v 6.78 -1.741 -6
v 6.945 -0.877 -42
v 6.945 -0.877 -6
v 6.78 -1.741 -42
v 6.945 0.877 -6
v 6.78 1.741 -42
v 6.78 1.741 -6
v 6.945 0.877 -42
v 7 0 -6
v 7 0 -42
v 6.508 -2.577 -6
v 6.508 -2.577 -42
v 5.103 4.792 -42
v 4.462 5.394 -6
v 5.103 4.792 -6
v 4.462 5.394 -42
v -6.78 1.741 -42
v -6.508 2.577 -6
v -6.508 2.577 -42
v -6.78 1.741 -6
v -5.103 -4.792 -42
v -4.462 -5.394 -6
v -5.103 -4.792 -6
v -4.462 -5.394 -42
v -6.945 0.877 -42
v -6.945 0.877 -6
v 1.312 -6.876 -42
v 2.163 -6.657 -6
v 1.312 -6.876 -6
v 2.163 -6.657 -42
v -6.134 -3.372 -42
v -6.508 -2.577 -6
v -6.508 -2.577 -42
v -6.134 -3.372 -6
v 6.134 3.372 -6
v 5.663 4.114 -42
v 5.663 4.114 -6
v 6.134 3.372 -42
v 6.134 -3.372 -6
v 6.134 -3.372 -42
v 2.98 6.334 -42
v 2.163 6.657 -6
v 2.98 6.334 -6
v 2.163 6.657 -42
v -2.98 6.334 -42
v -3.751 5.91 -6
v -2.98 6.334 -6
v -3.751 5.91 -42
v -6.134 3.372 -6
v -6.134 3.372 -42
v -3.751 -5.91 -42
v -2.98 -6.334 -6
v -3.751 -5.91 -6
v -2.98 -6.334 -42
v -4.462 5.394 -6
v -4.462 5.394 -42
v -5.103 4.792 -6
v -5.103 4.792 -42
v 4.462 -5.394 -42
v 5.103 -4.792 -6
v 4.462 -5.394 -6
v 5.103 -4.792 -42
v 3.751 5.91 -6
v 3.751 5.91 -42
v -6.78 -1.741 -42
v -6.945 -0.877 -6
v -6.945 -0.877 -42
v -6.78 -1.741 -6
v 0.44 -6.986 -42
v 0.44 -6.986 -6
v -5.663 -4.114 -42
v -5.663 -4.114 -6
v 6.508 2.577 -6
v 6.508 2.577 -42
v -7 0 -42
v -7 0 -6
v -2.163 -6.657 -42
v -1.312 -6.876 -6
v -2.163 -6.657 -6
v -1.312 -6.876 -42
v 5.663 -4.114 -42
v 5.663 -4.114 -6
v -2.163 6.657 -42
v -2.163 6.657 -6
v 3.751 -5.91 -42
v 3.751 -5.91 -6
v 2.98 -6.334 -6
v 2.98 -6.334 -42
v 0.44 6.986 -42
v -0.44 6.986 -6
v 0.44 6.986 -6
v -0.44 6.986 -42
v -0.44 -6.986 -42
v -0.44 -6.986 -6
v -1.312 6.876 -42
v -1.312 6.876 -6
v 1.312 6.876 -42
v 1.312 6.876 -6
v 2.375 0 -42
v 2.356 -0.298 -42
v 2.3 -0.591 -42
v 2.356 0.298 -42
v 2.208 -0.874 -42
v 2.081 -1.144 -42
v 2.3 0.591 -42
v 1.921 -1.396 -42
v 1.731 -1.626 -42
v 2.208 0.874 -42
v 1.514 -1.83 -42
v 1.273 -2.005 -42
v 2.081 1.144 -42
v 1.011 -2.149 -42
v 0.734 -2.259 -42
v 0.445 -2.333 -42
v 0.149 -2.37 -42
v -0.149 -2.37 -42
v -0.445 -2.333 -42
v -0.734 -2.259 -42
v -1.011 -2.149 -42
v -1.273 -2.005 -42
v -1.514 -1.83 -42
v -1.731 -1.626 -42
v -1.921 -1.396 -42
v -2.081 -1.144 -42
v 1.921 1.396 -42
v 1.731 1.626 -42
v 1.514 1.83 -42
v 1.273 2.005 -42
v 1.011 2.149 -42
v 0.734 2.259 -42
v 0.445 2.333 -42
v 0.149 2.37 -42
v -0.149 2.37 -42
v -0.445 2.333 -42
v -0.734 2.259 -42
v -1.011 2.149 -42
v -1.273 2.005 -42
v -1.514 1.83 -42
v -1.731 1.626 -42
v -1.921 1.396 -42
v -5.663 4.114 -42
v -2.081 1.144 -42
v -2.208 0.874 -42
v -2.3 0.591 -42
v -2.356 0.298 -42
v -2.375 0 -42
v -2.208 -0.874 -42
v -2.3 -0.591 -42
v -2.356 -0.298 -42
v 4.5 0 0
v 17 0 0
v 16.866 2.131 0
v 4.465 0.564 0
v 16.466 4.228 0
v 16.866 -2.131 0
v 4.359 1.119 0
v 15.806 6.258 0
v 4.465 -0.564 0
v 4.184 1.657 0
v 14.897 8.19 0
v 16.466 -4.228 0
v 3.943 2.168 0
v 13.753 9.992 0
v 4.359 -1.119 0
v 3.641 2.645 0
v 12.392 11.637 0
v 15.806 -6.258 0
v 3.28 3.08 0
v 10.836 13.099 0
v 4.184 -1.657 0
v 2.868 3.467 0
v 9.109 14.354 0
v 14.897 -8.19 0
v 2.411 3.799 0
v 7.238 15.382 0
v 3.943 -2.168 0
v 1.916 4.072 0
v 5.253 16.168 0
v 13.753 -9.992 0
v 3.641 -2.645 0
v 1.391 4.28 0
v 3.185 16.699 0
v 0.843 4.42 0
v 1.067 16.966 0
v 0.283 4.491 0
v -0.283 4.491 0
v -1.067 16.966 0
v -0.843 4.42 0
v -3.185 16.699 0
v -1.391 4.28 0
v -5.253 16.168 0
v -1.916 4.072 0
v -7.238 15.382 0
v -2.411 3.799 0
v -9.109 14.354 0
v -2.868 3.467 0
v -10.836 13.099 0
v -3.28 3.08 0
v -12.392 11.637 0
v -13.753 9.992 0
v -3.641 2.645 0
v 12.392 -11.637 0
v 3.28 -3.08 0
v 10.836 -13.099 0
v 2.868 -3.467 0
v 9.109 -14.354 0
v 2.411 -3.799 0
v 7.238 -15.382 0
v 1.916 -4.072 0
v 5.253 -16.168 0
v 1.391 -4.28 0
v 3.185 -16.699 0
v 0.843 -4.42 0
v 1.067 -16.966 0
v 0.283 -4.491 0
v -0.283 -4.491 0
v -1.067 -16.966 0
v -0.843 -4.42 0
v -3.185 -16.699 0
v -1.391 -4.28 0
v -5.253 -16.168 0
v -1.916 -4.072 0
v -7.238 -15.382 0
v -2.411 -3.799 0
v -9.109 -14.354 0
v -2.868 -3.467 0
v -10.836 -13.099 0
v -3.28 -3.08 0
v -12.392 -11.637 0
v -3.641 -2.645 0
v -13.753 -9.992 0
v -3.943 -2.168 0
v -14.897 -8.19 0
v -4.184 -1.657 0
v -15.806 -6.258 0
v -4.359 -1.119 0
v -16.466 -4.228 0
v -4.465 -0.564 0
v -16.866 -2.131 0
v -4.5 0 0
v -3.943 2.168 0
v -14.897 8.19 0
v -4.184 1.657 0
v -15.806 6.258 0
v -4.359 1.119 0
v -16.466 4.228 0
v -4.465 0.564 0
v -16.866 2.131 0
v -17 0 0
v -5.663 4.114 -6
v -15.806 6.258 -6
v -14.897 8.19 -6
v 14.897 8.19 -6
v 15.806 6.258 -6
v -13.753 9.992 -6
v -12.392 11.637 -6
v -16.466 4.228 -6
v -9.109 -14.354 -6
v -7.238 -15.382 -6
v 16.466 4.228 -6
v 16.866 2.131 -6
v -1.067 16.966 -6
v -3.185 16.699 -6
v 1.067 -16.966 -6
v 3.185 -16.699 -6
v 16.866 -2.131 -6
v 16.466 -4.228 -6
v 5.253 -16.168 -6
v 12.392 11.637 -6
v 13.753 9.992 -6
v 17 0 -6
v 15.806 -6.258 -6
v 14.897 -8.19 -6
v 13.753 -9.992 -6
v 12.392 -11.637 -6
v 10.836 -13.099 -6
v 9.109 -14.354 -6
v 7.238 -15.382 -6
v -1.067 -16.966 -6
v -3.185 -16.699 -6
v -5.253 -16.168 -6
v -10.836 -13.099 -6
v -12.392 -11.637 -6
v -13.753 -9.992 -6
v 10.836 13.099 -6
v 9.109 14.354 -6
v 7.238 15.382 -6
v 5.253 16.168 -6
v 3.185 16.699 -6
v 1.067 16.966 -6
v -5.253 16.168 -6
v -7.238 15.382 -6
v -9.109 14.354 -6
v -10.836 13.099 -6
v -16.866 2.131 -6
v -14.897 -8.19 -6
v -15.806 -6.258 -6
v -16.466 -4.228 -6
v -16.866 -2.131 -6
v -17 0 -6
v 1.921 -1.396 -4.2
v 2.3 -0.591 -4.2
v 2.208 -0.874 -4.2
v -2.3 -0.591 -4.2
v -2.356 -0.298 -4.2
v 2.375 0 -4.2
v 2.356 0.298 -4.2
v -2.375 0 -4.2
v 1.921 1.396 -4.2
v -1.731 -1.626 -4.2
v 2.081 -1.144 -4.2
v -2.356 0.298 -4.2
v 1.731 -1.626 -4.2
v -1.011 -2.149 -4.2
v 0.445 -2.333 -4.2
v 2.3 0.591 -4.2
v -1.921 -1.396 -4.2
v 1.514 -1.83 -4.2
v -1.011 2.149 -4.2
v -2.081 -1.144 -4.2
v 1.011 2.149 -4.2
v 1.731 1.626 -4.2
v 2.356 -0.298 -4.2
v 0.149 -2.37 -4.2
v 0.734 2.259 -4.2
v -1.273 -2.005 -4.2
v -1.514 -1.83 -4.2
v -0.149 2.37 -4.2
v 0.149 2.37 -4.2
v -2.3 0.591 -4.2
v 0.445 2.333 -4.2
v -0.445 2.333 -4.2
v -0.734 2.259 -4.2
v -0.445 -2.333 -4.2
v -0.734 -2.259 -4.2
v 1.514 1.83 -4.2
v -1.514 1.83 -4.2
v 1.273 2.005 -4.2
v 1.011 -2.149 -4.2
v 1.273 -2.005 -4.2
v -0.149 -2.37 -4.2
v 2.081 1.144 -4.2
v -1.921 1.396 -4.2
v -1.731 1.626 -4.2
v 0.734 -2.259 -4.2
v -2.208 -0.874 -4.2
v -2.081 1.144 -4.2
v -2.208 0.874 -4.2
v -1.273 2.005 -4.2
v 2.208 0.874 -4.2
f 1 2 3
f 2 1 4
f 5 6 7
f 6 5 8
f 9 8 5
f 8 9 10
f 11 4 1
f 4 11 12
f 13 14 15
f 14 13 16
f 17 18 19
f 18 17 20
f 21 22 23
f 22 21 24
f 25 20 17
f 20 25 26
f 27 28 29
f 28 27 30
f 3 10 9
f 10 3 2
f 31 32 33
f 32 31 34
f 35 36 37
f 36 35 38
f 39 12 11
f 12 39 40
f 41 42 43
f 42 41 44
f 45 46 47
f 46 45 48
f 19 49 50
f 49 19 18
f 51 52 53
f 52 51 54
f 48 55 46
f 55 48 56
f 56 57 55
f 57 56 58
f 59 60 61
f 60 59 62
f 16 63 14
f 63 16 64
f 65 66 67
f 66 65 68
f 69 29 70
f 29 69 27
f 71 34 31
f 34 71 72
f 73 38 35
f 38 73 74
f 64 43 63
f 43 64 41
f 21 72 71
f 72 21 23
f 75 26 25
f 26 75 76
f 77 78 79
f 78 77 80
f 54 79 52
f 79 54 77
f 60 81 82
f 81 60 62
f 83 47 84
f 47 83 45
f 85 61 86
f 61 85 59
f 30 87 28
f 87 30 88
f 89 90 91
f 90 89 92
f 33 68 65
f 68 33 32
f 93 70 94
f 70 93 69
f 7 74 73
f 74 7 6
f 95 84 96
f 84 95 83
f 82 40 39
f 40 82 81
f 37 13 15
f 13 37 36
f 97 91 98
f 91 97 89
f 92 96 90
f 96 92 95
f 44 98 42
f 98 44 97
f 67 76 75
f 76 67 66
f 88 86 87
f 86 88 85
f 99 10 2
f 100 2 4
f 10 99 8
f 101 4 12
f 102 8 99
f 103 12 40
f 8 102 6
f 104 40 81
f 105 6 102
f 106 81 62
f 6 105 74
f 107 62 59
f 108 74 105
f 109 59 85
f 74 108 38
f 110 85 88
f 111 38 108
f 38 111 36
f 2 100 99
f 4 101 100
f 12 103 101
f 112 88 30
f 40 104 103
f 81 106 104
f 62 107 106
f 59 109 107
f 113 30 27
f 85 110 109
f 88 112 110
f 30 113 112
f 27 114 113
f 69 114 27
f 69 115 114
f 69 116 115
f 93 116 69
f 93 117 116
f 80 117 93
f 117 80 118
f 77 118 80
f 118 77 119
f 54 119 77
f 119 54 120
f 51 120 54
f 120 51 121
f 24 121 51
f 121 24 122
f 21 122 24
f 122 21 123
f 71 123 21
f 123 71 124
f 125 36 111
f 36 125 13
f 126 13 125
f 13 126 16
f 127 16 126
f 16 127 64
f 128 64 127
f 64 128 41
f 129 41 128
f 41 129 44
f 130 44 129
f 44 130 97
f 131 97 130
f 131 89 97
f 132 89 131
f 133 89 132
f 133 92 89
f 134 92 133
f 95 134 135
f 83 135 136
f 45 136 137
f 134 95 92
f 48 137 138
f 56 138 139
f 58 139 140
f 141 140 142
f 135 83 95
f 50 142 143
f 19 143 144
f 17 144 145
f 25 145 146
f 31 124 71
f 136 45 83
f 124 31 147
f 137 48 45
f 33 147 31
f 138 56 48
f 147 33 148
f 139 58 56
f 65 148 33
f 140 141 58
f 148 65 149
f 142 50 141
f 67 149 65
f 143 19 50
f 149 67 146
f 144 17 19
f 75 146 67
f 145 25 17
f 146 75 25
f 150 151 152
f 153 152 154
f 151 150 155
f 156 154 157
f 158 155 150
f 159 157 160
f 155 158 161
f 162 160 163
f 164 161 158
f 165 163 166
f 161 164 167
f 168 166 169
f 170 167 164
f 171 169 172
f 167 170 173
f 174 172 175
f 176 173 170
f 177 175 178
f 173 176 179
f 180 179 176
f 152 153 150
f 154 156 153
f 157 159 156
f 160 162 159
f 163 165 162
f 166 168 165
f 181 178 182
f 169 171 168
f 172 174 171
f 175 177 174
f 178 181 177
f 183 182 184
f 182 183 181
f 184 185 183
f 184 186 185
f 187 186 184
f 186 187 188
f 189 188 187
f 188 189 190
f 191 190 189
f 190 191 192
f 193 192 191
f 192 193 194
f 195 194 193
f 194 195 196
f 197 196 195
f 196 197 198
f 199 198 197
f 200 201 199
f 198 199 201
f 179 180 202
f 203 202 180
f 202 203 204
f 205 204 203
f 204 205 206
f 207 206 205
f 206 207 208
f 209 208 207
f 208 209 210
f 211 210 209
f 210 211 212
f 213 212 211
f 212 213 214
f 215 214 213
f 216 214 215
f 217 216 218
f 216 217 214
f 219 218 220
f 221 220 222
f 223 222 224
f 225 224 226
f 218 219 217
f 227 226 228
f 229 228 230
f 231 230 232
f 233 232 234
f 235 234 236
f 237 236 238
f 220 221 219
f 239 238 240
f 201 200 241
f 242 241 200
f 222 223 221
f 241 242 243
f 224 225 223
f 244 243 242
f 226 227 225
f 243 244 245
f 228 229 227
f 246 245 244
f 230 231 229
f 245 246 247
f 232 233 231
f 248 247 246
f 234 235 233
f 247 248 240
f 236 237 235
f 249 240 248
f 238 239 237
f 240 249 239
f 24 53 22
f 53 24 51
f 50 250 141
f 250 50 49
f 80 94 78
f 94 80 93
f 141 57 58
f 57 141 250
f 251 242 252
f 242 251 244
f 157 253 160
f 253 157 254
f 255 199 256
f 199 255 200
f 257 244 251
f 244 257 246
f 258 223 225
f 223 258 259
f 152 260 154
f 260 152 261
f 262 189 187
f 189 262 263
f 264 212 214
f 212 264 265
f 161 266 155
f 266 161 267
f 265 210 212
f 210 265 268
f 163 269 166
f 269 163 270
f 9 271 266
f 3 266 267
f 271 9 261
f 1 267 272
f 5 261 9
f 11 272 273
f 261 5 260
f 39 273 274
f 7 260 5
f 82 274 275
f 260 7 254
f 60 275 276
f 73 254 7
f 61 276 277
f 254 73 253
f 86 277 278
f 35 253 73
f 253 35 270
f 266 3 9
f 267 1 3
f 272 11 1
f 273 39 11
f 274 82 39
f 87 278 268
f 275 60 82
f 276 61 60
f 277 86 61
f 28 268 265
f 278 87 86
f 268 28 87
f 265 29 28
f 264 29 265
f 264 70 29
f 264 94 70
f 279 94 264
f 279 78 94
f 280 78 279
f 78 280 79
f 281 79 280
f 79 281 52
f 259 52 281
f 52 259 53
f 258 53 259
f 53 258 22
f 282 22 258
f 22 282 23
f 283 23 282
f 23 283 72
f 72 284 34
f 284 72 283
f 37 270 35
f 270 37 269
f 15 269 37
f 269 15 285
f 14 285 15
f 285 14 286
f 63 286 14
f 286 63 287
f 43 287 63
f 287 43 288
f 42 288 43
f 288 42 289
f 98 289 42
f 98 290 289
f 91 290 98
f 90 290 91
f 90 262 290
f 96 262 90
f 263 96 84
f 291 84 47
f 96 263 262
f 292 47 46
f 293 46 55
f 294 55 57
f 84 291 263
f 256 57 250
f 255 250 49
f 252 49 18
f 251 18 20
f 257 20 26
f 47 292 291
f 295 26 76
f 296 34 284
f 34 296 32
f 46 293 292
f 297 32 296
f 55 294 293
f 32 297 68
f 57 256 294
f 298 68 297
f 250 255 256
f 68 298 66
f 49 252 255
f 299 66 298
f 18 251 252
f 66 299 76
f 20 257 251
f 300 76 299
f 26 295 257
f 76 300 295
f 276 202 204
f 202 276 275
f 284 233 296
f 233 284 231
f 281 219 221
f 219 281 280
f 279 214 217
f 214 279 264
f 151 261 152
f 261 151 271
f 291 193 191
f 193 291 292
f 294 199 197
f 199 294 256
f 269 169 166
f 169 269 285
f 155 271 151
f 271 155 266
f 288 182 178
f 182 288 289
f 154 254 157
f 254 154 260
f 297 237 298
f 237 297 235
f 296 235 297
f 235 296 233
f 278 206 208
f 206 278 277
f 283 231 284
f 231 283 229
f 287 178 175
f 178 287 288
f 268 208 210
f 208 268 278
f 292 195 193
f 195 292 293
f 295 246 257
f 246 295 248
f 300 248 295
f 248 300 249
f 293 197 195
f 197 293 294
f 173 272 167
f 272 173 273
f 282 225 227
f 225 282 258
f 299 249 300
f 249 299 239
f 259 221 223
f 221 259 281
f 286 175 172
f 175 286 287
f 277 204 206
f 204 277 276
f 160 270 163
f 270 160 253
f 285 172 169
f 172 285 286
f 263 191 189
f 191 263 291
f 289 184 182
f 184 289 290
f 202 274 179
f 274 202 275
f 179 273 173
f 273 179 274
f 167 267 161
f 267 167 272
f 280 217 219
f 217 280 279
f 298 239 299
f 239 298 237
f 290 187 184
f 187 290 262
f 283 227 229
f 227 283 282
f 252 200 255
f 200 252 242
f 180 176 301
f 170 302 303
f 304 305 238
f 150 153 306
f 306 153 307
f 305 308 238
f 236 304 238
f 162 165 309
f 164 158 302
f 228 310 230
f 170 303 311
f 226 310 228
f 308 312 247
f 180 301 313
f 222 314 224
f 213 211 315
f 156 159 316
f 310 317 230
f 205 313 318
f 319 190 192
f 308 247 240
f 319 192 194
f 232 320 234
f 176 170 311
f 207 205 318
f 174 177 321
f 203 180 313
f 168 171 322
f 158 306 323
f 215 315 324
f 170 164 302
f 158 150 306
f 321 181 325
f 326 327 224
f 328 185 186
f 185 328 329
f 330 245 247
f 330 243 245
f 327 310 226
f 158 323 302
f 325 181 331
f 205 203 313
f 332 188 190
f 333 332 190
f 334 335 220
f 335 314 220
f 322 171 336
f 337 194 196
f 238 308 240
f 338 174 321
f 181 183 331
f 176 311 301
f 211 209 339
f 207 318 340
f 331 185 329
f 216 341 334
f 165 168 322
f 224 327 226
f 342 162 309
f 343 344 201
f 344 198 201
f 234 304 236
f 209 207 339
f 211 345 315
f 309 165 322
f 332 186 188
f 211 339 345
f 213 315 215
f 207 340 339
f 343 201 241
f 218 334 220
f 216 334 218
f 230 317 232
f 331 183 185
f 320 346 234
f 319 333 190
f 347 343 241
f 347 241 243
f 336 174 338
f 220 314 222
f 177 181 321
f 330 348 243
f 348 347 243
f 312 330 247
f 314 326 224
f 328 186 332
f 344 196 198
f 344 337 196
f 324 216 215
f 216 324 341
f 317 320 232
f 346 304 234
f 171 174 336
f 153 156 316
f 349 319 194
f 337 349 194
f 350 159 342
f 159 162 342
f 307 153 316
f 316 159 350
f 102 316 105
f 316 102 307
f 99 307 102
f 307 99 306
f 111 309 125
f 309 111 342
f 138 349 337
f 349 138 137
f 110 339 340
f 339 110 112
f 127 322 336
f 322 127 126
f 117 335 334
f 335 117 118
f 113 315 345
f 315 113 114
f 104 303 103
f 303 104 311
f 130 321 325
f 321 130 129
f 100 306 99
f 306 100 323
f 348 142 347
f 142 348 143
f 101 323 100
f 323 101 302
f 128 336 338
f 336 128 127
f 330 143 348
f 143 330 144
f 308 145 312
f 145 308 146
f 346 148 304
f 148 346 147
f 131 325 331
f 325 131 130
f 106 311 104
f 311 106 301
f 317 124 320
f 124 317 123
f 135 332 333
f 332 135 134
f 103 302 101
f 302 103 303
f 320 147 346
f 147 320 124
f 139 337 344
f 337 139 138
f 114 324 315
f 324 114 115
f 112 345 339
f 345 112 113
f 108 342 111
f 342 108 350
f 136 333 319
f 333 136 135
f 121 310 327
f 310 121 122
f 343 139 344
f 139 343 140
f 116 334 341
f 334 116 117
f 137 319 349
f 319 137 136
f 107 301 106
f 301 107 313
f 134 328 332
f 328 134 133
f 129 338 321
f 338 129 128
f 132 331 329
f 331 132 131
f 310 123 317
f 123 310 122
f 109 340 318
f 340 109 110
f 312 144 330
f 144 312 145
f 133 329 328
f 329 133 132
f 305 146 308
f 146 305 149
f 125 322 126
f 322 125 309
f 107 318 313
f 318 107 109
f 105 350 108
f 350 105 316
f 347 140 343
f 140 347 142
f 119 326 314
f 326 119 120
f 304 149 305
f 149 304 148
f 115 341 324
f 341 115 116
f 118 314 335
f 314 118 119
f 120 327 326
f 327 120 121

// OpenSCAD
$fn = 50;


difference() {
	union() {
		translate(v = [0, 0, -42.0000000000]) {
			cylinder(h = 42, r = 7.0000000000);
		}
		translate(v = [0, 0, -6.0000000000]) {
			cylinder(h = 6, r = 17.0000000000);
		}
	}
	union() {
		translate(v = [0, 0, 0]) {
			rotate(a = [0, 0, 0]) {
				difference() {
					union() {
						#translate(v = [0, 0, -42.0000000000]) {
							cylinder(h = 42, r = 2.2500000000);
						}
						#translate(v = [0, 0, -4.2000000000]) {
							cylinder(h = 4.2000000000, r = 7.0000000000, r1 = 2.3750000000, r2 = 4.5000000000);
						}
						#translate(v = [0, 0, -42.0000000000]) {
							cylinder(h = 42, r = 2.3750000000);
						}
						#translate(v = [0, 0, -42.0000000000]) {
							cylinder(h = 42, r = 2.2500000000);
						}
					}
					union();
				}
			}
		}
	}
}
